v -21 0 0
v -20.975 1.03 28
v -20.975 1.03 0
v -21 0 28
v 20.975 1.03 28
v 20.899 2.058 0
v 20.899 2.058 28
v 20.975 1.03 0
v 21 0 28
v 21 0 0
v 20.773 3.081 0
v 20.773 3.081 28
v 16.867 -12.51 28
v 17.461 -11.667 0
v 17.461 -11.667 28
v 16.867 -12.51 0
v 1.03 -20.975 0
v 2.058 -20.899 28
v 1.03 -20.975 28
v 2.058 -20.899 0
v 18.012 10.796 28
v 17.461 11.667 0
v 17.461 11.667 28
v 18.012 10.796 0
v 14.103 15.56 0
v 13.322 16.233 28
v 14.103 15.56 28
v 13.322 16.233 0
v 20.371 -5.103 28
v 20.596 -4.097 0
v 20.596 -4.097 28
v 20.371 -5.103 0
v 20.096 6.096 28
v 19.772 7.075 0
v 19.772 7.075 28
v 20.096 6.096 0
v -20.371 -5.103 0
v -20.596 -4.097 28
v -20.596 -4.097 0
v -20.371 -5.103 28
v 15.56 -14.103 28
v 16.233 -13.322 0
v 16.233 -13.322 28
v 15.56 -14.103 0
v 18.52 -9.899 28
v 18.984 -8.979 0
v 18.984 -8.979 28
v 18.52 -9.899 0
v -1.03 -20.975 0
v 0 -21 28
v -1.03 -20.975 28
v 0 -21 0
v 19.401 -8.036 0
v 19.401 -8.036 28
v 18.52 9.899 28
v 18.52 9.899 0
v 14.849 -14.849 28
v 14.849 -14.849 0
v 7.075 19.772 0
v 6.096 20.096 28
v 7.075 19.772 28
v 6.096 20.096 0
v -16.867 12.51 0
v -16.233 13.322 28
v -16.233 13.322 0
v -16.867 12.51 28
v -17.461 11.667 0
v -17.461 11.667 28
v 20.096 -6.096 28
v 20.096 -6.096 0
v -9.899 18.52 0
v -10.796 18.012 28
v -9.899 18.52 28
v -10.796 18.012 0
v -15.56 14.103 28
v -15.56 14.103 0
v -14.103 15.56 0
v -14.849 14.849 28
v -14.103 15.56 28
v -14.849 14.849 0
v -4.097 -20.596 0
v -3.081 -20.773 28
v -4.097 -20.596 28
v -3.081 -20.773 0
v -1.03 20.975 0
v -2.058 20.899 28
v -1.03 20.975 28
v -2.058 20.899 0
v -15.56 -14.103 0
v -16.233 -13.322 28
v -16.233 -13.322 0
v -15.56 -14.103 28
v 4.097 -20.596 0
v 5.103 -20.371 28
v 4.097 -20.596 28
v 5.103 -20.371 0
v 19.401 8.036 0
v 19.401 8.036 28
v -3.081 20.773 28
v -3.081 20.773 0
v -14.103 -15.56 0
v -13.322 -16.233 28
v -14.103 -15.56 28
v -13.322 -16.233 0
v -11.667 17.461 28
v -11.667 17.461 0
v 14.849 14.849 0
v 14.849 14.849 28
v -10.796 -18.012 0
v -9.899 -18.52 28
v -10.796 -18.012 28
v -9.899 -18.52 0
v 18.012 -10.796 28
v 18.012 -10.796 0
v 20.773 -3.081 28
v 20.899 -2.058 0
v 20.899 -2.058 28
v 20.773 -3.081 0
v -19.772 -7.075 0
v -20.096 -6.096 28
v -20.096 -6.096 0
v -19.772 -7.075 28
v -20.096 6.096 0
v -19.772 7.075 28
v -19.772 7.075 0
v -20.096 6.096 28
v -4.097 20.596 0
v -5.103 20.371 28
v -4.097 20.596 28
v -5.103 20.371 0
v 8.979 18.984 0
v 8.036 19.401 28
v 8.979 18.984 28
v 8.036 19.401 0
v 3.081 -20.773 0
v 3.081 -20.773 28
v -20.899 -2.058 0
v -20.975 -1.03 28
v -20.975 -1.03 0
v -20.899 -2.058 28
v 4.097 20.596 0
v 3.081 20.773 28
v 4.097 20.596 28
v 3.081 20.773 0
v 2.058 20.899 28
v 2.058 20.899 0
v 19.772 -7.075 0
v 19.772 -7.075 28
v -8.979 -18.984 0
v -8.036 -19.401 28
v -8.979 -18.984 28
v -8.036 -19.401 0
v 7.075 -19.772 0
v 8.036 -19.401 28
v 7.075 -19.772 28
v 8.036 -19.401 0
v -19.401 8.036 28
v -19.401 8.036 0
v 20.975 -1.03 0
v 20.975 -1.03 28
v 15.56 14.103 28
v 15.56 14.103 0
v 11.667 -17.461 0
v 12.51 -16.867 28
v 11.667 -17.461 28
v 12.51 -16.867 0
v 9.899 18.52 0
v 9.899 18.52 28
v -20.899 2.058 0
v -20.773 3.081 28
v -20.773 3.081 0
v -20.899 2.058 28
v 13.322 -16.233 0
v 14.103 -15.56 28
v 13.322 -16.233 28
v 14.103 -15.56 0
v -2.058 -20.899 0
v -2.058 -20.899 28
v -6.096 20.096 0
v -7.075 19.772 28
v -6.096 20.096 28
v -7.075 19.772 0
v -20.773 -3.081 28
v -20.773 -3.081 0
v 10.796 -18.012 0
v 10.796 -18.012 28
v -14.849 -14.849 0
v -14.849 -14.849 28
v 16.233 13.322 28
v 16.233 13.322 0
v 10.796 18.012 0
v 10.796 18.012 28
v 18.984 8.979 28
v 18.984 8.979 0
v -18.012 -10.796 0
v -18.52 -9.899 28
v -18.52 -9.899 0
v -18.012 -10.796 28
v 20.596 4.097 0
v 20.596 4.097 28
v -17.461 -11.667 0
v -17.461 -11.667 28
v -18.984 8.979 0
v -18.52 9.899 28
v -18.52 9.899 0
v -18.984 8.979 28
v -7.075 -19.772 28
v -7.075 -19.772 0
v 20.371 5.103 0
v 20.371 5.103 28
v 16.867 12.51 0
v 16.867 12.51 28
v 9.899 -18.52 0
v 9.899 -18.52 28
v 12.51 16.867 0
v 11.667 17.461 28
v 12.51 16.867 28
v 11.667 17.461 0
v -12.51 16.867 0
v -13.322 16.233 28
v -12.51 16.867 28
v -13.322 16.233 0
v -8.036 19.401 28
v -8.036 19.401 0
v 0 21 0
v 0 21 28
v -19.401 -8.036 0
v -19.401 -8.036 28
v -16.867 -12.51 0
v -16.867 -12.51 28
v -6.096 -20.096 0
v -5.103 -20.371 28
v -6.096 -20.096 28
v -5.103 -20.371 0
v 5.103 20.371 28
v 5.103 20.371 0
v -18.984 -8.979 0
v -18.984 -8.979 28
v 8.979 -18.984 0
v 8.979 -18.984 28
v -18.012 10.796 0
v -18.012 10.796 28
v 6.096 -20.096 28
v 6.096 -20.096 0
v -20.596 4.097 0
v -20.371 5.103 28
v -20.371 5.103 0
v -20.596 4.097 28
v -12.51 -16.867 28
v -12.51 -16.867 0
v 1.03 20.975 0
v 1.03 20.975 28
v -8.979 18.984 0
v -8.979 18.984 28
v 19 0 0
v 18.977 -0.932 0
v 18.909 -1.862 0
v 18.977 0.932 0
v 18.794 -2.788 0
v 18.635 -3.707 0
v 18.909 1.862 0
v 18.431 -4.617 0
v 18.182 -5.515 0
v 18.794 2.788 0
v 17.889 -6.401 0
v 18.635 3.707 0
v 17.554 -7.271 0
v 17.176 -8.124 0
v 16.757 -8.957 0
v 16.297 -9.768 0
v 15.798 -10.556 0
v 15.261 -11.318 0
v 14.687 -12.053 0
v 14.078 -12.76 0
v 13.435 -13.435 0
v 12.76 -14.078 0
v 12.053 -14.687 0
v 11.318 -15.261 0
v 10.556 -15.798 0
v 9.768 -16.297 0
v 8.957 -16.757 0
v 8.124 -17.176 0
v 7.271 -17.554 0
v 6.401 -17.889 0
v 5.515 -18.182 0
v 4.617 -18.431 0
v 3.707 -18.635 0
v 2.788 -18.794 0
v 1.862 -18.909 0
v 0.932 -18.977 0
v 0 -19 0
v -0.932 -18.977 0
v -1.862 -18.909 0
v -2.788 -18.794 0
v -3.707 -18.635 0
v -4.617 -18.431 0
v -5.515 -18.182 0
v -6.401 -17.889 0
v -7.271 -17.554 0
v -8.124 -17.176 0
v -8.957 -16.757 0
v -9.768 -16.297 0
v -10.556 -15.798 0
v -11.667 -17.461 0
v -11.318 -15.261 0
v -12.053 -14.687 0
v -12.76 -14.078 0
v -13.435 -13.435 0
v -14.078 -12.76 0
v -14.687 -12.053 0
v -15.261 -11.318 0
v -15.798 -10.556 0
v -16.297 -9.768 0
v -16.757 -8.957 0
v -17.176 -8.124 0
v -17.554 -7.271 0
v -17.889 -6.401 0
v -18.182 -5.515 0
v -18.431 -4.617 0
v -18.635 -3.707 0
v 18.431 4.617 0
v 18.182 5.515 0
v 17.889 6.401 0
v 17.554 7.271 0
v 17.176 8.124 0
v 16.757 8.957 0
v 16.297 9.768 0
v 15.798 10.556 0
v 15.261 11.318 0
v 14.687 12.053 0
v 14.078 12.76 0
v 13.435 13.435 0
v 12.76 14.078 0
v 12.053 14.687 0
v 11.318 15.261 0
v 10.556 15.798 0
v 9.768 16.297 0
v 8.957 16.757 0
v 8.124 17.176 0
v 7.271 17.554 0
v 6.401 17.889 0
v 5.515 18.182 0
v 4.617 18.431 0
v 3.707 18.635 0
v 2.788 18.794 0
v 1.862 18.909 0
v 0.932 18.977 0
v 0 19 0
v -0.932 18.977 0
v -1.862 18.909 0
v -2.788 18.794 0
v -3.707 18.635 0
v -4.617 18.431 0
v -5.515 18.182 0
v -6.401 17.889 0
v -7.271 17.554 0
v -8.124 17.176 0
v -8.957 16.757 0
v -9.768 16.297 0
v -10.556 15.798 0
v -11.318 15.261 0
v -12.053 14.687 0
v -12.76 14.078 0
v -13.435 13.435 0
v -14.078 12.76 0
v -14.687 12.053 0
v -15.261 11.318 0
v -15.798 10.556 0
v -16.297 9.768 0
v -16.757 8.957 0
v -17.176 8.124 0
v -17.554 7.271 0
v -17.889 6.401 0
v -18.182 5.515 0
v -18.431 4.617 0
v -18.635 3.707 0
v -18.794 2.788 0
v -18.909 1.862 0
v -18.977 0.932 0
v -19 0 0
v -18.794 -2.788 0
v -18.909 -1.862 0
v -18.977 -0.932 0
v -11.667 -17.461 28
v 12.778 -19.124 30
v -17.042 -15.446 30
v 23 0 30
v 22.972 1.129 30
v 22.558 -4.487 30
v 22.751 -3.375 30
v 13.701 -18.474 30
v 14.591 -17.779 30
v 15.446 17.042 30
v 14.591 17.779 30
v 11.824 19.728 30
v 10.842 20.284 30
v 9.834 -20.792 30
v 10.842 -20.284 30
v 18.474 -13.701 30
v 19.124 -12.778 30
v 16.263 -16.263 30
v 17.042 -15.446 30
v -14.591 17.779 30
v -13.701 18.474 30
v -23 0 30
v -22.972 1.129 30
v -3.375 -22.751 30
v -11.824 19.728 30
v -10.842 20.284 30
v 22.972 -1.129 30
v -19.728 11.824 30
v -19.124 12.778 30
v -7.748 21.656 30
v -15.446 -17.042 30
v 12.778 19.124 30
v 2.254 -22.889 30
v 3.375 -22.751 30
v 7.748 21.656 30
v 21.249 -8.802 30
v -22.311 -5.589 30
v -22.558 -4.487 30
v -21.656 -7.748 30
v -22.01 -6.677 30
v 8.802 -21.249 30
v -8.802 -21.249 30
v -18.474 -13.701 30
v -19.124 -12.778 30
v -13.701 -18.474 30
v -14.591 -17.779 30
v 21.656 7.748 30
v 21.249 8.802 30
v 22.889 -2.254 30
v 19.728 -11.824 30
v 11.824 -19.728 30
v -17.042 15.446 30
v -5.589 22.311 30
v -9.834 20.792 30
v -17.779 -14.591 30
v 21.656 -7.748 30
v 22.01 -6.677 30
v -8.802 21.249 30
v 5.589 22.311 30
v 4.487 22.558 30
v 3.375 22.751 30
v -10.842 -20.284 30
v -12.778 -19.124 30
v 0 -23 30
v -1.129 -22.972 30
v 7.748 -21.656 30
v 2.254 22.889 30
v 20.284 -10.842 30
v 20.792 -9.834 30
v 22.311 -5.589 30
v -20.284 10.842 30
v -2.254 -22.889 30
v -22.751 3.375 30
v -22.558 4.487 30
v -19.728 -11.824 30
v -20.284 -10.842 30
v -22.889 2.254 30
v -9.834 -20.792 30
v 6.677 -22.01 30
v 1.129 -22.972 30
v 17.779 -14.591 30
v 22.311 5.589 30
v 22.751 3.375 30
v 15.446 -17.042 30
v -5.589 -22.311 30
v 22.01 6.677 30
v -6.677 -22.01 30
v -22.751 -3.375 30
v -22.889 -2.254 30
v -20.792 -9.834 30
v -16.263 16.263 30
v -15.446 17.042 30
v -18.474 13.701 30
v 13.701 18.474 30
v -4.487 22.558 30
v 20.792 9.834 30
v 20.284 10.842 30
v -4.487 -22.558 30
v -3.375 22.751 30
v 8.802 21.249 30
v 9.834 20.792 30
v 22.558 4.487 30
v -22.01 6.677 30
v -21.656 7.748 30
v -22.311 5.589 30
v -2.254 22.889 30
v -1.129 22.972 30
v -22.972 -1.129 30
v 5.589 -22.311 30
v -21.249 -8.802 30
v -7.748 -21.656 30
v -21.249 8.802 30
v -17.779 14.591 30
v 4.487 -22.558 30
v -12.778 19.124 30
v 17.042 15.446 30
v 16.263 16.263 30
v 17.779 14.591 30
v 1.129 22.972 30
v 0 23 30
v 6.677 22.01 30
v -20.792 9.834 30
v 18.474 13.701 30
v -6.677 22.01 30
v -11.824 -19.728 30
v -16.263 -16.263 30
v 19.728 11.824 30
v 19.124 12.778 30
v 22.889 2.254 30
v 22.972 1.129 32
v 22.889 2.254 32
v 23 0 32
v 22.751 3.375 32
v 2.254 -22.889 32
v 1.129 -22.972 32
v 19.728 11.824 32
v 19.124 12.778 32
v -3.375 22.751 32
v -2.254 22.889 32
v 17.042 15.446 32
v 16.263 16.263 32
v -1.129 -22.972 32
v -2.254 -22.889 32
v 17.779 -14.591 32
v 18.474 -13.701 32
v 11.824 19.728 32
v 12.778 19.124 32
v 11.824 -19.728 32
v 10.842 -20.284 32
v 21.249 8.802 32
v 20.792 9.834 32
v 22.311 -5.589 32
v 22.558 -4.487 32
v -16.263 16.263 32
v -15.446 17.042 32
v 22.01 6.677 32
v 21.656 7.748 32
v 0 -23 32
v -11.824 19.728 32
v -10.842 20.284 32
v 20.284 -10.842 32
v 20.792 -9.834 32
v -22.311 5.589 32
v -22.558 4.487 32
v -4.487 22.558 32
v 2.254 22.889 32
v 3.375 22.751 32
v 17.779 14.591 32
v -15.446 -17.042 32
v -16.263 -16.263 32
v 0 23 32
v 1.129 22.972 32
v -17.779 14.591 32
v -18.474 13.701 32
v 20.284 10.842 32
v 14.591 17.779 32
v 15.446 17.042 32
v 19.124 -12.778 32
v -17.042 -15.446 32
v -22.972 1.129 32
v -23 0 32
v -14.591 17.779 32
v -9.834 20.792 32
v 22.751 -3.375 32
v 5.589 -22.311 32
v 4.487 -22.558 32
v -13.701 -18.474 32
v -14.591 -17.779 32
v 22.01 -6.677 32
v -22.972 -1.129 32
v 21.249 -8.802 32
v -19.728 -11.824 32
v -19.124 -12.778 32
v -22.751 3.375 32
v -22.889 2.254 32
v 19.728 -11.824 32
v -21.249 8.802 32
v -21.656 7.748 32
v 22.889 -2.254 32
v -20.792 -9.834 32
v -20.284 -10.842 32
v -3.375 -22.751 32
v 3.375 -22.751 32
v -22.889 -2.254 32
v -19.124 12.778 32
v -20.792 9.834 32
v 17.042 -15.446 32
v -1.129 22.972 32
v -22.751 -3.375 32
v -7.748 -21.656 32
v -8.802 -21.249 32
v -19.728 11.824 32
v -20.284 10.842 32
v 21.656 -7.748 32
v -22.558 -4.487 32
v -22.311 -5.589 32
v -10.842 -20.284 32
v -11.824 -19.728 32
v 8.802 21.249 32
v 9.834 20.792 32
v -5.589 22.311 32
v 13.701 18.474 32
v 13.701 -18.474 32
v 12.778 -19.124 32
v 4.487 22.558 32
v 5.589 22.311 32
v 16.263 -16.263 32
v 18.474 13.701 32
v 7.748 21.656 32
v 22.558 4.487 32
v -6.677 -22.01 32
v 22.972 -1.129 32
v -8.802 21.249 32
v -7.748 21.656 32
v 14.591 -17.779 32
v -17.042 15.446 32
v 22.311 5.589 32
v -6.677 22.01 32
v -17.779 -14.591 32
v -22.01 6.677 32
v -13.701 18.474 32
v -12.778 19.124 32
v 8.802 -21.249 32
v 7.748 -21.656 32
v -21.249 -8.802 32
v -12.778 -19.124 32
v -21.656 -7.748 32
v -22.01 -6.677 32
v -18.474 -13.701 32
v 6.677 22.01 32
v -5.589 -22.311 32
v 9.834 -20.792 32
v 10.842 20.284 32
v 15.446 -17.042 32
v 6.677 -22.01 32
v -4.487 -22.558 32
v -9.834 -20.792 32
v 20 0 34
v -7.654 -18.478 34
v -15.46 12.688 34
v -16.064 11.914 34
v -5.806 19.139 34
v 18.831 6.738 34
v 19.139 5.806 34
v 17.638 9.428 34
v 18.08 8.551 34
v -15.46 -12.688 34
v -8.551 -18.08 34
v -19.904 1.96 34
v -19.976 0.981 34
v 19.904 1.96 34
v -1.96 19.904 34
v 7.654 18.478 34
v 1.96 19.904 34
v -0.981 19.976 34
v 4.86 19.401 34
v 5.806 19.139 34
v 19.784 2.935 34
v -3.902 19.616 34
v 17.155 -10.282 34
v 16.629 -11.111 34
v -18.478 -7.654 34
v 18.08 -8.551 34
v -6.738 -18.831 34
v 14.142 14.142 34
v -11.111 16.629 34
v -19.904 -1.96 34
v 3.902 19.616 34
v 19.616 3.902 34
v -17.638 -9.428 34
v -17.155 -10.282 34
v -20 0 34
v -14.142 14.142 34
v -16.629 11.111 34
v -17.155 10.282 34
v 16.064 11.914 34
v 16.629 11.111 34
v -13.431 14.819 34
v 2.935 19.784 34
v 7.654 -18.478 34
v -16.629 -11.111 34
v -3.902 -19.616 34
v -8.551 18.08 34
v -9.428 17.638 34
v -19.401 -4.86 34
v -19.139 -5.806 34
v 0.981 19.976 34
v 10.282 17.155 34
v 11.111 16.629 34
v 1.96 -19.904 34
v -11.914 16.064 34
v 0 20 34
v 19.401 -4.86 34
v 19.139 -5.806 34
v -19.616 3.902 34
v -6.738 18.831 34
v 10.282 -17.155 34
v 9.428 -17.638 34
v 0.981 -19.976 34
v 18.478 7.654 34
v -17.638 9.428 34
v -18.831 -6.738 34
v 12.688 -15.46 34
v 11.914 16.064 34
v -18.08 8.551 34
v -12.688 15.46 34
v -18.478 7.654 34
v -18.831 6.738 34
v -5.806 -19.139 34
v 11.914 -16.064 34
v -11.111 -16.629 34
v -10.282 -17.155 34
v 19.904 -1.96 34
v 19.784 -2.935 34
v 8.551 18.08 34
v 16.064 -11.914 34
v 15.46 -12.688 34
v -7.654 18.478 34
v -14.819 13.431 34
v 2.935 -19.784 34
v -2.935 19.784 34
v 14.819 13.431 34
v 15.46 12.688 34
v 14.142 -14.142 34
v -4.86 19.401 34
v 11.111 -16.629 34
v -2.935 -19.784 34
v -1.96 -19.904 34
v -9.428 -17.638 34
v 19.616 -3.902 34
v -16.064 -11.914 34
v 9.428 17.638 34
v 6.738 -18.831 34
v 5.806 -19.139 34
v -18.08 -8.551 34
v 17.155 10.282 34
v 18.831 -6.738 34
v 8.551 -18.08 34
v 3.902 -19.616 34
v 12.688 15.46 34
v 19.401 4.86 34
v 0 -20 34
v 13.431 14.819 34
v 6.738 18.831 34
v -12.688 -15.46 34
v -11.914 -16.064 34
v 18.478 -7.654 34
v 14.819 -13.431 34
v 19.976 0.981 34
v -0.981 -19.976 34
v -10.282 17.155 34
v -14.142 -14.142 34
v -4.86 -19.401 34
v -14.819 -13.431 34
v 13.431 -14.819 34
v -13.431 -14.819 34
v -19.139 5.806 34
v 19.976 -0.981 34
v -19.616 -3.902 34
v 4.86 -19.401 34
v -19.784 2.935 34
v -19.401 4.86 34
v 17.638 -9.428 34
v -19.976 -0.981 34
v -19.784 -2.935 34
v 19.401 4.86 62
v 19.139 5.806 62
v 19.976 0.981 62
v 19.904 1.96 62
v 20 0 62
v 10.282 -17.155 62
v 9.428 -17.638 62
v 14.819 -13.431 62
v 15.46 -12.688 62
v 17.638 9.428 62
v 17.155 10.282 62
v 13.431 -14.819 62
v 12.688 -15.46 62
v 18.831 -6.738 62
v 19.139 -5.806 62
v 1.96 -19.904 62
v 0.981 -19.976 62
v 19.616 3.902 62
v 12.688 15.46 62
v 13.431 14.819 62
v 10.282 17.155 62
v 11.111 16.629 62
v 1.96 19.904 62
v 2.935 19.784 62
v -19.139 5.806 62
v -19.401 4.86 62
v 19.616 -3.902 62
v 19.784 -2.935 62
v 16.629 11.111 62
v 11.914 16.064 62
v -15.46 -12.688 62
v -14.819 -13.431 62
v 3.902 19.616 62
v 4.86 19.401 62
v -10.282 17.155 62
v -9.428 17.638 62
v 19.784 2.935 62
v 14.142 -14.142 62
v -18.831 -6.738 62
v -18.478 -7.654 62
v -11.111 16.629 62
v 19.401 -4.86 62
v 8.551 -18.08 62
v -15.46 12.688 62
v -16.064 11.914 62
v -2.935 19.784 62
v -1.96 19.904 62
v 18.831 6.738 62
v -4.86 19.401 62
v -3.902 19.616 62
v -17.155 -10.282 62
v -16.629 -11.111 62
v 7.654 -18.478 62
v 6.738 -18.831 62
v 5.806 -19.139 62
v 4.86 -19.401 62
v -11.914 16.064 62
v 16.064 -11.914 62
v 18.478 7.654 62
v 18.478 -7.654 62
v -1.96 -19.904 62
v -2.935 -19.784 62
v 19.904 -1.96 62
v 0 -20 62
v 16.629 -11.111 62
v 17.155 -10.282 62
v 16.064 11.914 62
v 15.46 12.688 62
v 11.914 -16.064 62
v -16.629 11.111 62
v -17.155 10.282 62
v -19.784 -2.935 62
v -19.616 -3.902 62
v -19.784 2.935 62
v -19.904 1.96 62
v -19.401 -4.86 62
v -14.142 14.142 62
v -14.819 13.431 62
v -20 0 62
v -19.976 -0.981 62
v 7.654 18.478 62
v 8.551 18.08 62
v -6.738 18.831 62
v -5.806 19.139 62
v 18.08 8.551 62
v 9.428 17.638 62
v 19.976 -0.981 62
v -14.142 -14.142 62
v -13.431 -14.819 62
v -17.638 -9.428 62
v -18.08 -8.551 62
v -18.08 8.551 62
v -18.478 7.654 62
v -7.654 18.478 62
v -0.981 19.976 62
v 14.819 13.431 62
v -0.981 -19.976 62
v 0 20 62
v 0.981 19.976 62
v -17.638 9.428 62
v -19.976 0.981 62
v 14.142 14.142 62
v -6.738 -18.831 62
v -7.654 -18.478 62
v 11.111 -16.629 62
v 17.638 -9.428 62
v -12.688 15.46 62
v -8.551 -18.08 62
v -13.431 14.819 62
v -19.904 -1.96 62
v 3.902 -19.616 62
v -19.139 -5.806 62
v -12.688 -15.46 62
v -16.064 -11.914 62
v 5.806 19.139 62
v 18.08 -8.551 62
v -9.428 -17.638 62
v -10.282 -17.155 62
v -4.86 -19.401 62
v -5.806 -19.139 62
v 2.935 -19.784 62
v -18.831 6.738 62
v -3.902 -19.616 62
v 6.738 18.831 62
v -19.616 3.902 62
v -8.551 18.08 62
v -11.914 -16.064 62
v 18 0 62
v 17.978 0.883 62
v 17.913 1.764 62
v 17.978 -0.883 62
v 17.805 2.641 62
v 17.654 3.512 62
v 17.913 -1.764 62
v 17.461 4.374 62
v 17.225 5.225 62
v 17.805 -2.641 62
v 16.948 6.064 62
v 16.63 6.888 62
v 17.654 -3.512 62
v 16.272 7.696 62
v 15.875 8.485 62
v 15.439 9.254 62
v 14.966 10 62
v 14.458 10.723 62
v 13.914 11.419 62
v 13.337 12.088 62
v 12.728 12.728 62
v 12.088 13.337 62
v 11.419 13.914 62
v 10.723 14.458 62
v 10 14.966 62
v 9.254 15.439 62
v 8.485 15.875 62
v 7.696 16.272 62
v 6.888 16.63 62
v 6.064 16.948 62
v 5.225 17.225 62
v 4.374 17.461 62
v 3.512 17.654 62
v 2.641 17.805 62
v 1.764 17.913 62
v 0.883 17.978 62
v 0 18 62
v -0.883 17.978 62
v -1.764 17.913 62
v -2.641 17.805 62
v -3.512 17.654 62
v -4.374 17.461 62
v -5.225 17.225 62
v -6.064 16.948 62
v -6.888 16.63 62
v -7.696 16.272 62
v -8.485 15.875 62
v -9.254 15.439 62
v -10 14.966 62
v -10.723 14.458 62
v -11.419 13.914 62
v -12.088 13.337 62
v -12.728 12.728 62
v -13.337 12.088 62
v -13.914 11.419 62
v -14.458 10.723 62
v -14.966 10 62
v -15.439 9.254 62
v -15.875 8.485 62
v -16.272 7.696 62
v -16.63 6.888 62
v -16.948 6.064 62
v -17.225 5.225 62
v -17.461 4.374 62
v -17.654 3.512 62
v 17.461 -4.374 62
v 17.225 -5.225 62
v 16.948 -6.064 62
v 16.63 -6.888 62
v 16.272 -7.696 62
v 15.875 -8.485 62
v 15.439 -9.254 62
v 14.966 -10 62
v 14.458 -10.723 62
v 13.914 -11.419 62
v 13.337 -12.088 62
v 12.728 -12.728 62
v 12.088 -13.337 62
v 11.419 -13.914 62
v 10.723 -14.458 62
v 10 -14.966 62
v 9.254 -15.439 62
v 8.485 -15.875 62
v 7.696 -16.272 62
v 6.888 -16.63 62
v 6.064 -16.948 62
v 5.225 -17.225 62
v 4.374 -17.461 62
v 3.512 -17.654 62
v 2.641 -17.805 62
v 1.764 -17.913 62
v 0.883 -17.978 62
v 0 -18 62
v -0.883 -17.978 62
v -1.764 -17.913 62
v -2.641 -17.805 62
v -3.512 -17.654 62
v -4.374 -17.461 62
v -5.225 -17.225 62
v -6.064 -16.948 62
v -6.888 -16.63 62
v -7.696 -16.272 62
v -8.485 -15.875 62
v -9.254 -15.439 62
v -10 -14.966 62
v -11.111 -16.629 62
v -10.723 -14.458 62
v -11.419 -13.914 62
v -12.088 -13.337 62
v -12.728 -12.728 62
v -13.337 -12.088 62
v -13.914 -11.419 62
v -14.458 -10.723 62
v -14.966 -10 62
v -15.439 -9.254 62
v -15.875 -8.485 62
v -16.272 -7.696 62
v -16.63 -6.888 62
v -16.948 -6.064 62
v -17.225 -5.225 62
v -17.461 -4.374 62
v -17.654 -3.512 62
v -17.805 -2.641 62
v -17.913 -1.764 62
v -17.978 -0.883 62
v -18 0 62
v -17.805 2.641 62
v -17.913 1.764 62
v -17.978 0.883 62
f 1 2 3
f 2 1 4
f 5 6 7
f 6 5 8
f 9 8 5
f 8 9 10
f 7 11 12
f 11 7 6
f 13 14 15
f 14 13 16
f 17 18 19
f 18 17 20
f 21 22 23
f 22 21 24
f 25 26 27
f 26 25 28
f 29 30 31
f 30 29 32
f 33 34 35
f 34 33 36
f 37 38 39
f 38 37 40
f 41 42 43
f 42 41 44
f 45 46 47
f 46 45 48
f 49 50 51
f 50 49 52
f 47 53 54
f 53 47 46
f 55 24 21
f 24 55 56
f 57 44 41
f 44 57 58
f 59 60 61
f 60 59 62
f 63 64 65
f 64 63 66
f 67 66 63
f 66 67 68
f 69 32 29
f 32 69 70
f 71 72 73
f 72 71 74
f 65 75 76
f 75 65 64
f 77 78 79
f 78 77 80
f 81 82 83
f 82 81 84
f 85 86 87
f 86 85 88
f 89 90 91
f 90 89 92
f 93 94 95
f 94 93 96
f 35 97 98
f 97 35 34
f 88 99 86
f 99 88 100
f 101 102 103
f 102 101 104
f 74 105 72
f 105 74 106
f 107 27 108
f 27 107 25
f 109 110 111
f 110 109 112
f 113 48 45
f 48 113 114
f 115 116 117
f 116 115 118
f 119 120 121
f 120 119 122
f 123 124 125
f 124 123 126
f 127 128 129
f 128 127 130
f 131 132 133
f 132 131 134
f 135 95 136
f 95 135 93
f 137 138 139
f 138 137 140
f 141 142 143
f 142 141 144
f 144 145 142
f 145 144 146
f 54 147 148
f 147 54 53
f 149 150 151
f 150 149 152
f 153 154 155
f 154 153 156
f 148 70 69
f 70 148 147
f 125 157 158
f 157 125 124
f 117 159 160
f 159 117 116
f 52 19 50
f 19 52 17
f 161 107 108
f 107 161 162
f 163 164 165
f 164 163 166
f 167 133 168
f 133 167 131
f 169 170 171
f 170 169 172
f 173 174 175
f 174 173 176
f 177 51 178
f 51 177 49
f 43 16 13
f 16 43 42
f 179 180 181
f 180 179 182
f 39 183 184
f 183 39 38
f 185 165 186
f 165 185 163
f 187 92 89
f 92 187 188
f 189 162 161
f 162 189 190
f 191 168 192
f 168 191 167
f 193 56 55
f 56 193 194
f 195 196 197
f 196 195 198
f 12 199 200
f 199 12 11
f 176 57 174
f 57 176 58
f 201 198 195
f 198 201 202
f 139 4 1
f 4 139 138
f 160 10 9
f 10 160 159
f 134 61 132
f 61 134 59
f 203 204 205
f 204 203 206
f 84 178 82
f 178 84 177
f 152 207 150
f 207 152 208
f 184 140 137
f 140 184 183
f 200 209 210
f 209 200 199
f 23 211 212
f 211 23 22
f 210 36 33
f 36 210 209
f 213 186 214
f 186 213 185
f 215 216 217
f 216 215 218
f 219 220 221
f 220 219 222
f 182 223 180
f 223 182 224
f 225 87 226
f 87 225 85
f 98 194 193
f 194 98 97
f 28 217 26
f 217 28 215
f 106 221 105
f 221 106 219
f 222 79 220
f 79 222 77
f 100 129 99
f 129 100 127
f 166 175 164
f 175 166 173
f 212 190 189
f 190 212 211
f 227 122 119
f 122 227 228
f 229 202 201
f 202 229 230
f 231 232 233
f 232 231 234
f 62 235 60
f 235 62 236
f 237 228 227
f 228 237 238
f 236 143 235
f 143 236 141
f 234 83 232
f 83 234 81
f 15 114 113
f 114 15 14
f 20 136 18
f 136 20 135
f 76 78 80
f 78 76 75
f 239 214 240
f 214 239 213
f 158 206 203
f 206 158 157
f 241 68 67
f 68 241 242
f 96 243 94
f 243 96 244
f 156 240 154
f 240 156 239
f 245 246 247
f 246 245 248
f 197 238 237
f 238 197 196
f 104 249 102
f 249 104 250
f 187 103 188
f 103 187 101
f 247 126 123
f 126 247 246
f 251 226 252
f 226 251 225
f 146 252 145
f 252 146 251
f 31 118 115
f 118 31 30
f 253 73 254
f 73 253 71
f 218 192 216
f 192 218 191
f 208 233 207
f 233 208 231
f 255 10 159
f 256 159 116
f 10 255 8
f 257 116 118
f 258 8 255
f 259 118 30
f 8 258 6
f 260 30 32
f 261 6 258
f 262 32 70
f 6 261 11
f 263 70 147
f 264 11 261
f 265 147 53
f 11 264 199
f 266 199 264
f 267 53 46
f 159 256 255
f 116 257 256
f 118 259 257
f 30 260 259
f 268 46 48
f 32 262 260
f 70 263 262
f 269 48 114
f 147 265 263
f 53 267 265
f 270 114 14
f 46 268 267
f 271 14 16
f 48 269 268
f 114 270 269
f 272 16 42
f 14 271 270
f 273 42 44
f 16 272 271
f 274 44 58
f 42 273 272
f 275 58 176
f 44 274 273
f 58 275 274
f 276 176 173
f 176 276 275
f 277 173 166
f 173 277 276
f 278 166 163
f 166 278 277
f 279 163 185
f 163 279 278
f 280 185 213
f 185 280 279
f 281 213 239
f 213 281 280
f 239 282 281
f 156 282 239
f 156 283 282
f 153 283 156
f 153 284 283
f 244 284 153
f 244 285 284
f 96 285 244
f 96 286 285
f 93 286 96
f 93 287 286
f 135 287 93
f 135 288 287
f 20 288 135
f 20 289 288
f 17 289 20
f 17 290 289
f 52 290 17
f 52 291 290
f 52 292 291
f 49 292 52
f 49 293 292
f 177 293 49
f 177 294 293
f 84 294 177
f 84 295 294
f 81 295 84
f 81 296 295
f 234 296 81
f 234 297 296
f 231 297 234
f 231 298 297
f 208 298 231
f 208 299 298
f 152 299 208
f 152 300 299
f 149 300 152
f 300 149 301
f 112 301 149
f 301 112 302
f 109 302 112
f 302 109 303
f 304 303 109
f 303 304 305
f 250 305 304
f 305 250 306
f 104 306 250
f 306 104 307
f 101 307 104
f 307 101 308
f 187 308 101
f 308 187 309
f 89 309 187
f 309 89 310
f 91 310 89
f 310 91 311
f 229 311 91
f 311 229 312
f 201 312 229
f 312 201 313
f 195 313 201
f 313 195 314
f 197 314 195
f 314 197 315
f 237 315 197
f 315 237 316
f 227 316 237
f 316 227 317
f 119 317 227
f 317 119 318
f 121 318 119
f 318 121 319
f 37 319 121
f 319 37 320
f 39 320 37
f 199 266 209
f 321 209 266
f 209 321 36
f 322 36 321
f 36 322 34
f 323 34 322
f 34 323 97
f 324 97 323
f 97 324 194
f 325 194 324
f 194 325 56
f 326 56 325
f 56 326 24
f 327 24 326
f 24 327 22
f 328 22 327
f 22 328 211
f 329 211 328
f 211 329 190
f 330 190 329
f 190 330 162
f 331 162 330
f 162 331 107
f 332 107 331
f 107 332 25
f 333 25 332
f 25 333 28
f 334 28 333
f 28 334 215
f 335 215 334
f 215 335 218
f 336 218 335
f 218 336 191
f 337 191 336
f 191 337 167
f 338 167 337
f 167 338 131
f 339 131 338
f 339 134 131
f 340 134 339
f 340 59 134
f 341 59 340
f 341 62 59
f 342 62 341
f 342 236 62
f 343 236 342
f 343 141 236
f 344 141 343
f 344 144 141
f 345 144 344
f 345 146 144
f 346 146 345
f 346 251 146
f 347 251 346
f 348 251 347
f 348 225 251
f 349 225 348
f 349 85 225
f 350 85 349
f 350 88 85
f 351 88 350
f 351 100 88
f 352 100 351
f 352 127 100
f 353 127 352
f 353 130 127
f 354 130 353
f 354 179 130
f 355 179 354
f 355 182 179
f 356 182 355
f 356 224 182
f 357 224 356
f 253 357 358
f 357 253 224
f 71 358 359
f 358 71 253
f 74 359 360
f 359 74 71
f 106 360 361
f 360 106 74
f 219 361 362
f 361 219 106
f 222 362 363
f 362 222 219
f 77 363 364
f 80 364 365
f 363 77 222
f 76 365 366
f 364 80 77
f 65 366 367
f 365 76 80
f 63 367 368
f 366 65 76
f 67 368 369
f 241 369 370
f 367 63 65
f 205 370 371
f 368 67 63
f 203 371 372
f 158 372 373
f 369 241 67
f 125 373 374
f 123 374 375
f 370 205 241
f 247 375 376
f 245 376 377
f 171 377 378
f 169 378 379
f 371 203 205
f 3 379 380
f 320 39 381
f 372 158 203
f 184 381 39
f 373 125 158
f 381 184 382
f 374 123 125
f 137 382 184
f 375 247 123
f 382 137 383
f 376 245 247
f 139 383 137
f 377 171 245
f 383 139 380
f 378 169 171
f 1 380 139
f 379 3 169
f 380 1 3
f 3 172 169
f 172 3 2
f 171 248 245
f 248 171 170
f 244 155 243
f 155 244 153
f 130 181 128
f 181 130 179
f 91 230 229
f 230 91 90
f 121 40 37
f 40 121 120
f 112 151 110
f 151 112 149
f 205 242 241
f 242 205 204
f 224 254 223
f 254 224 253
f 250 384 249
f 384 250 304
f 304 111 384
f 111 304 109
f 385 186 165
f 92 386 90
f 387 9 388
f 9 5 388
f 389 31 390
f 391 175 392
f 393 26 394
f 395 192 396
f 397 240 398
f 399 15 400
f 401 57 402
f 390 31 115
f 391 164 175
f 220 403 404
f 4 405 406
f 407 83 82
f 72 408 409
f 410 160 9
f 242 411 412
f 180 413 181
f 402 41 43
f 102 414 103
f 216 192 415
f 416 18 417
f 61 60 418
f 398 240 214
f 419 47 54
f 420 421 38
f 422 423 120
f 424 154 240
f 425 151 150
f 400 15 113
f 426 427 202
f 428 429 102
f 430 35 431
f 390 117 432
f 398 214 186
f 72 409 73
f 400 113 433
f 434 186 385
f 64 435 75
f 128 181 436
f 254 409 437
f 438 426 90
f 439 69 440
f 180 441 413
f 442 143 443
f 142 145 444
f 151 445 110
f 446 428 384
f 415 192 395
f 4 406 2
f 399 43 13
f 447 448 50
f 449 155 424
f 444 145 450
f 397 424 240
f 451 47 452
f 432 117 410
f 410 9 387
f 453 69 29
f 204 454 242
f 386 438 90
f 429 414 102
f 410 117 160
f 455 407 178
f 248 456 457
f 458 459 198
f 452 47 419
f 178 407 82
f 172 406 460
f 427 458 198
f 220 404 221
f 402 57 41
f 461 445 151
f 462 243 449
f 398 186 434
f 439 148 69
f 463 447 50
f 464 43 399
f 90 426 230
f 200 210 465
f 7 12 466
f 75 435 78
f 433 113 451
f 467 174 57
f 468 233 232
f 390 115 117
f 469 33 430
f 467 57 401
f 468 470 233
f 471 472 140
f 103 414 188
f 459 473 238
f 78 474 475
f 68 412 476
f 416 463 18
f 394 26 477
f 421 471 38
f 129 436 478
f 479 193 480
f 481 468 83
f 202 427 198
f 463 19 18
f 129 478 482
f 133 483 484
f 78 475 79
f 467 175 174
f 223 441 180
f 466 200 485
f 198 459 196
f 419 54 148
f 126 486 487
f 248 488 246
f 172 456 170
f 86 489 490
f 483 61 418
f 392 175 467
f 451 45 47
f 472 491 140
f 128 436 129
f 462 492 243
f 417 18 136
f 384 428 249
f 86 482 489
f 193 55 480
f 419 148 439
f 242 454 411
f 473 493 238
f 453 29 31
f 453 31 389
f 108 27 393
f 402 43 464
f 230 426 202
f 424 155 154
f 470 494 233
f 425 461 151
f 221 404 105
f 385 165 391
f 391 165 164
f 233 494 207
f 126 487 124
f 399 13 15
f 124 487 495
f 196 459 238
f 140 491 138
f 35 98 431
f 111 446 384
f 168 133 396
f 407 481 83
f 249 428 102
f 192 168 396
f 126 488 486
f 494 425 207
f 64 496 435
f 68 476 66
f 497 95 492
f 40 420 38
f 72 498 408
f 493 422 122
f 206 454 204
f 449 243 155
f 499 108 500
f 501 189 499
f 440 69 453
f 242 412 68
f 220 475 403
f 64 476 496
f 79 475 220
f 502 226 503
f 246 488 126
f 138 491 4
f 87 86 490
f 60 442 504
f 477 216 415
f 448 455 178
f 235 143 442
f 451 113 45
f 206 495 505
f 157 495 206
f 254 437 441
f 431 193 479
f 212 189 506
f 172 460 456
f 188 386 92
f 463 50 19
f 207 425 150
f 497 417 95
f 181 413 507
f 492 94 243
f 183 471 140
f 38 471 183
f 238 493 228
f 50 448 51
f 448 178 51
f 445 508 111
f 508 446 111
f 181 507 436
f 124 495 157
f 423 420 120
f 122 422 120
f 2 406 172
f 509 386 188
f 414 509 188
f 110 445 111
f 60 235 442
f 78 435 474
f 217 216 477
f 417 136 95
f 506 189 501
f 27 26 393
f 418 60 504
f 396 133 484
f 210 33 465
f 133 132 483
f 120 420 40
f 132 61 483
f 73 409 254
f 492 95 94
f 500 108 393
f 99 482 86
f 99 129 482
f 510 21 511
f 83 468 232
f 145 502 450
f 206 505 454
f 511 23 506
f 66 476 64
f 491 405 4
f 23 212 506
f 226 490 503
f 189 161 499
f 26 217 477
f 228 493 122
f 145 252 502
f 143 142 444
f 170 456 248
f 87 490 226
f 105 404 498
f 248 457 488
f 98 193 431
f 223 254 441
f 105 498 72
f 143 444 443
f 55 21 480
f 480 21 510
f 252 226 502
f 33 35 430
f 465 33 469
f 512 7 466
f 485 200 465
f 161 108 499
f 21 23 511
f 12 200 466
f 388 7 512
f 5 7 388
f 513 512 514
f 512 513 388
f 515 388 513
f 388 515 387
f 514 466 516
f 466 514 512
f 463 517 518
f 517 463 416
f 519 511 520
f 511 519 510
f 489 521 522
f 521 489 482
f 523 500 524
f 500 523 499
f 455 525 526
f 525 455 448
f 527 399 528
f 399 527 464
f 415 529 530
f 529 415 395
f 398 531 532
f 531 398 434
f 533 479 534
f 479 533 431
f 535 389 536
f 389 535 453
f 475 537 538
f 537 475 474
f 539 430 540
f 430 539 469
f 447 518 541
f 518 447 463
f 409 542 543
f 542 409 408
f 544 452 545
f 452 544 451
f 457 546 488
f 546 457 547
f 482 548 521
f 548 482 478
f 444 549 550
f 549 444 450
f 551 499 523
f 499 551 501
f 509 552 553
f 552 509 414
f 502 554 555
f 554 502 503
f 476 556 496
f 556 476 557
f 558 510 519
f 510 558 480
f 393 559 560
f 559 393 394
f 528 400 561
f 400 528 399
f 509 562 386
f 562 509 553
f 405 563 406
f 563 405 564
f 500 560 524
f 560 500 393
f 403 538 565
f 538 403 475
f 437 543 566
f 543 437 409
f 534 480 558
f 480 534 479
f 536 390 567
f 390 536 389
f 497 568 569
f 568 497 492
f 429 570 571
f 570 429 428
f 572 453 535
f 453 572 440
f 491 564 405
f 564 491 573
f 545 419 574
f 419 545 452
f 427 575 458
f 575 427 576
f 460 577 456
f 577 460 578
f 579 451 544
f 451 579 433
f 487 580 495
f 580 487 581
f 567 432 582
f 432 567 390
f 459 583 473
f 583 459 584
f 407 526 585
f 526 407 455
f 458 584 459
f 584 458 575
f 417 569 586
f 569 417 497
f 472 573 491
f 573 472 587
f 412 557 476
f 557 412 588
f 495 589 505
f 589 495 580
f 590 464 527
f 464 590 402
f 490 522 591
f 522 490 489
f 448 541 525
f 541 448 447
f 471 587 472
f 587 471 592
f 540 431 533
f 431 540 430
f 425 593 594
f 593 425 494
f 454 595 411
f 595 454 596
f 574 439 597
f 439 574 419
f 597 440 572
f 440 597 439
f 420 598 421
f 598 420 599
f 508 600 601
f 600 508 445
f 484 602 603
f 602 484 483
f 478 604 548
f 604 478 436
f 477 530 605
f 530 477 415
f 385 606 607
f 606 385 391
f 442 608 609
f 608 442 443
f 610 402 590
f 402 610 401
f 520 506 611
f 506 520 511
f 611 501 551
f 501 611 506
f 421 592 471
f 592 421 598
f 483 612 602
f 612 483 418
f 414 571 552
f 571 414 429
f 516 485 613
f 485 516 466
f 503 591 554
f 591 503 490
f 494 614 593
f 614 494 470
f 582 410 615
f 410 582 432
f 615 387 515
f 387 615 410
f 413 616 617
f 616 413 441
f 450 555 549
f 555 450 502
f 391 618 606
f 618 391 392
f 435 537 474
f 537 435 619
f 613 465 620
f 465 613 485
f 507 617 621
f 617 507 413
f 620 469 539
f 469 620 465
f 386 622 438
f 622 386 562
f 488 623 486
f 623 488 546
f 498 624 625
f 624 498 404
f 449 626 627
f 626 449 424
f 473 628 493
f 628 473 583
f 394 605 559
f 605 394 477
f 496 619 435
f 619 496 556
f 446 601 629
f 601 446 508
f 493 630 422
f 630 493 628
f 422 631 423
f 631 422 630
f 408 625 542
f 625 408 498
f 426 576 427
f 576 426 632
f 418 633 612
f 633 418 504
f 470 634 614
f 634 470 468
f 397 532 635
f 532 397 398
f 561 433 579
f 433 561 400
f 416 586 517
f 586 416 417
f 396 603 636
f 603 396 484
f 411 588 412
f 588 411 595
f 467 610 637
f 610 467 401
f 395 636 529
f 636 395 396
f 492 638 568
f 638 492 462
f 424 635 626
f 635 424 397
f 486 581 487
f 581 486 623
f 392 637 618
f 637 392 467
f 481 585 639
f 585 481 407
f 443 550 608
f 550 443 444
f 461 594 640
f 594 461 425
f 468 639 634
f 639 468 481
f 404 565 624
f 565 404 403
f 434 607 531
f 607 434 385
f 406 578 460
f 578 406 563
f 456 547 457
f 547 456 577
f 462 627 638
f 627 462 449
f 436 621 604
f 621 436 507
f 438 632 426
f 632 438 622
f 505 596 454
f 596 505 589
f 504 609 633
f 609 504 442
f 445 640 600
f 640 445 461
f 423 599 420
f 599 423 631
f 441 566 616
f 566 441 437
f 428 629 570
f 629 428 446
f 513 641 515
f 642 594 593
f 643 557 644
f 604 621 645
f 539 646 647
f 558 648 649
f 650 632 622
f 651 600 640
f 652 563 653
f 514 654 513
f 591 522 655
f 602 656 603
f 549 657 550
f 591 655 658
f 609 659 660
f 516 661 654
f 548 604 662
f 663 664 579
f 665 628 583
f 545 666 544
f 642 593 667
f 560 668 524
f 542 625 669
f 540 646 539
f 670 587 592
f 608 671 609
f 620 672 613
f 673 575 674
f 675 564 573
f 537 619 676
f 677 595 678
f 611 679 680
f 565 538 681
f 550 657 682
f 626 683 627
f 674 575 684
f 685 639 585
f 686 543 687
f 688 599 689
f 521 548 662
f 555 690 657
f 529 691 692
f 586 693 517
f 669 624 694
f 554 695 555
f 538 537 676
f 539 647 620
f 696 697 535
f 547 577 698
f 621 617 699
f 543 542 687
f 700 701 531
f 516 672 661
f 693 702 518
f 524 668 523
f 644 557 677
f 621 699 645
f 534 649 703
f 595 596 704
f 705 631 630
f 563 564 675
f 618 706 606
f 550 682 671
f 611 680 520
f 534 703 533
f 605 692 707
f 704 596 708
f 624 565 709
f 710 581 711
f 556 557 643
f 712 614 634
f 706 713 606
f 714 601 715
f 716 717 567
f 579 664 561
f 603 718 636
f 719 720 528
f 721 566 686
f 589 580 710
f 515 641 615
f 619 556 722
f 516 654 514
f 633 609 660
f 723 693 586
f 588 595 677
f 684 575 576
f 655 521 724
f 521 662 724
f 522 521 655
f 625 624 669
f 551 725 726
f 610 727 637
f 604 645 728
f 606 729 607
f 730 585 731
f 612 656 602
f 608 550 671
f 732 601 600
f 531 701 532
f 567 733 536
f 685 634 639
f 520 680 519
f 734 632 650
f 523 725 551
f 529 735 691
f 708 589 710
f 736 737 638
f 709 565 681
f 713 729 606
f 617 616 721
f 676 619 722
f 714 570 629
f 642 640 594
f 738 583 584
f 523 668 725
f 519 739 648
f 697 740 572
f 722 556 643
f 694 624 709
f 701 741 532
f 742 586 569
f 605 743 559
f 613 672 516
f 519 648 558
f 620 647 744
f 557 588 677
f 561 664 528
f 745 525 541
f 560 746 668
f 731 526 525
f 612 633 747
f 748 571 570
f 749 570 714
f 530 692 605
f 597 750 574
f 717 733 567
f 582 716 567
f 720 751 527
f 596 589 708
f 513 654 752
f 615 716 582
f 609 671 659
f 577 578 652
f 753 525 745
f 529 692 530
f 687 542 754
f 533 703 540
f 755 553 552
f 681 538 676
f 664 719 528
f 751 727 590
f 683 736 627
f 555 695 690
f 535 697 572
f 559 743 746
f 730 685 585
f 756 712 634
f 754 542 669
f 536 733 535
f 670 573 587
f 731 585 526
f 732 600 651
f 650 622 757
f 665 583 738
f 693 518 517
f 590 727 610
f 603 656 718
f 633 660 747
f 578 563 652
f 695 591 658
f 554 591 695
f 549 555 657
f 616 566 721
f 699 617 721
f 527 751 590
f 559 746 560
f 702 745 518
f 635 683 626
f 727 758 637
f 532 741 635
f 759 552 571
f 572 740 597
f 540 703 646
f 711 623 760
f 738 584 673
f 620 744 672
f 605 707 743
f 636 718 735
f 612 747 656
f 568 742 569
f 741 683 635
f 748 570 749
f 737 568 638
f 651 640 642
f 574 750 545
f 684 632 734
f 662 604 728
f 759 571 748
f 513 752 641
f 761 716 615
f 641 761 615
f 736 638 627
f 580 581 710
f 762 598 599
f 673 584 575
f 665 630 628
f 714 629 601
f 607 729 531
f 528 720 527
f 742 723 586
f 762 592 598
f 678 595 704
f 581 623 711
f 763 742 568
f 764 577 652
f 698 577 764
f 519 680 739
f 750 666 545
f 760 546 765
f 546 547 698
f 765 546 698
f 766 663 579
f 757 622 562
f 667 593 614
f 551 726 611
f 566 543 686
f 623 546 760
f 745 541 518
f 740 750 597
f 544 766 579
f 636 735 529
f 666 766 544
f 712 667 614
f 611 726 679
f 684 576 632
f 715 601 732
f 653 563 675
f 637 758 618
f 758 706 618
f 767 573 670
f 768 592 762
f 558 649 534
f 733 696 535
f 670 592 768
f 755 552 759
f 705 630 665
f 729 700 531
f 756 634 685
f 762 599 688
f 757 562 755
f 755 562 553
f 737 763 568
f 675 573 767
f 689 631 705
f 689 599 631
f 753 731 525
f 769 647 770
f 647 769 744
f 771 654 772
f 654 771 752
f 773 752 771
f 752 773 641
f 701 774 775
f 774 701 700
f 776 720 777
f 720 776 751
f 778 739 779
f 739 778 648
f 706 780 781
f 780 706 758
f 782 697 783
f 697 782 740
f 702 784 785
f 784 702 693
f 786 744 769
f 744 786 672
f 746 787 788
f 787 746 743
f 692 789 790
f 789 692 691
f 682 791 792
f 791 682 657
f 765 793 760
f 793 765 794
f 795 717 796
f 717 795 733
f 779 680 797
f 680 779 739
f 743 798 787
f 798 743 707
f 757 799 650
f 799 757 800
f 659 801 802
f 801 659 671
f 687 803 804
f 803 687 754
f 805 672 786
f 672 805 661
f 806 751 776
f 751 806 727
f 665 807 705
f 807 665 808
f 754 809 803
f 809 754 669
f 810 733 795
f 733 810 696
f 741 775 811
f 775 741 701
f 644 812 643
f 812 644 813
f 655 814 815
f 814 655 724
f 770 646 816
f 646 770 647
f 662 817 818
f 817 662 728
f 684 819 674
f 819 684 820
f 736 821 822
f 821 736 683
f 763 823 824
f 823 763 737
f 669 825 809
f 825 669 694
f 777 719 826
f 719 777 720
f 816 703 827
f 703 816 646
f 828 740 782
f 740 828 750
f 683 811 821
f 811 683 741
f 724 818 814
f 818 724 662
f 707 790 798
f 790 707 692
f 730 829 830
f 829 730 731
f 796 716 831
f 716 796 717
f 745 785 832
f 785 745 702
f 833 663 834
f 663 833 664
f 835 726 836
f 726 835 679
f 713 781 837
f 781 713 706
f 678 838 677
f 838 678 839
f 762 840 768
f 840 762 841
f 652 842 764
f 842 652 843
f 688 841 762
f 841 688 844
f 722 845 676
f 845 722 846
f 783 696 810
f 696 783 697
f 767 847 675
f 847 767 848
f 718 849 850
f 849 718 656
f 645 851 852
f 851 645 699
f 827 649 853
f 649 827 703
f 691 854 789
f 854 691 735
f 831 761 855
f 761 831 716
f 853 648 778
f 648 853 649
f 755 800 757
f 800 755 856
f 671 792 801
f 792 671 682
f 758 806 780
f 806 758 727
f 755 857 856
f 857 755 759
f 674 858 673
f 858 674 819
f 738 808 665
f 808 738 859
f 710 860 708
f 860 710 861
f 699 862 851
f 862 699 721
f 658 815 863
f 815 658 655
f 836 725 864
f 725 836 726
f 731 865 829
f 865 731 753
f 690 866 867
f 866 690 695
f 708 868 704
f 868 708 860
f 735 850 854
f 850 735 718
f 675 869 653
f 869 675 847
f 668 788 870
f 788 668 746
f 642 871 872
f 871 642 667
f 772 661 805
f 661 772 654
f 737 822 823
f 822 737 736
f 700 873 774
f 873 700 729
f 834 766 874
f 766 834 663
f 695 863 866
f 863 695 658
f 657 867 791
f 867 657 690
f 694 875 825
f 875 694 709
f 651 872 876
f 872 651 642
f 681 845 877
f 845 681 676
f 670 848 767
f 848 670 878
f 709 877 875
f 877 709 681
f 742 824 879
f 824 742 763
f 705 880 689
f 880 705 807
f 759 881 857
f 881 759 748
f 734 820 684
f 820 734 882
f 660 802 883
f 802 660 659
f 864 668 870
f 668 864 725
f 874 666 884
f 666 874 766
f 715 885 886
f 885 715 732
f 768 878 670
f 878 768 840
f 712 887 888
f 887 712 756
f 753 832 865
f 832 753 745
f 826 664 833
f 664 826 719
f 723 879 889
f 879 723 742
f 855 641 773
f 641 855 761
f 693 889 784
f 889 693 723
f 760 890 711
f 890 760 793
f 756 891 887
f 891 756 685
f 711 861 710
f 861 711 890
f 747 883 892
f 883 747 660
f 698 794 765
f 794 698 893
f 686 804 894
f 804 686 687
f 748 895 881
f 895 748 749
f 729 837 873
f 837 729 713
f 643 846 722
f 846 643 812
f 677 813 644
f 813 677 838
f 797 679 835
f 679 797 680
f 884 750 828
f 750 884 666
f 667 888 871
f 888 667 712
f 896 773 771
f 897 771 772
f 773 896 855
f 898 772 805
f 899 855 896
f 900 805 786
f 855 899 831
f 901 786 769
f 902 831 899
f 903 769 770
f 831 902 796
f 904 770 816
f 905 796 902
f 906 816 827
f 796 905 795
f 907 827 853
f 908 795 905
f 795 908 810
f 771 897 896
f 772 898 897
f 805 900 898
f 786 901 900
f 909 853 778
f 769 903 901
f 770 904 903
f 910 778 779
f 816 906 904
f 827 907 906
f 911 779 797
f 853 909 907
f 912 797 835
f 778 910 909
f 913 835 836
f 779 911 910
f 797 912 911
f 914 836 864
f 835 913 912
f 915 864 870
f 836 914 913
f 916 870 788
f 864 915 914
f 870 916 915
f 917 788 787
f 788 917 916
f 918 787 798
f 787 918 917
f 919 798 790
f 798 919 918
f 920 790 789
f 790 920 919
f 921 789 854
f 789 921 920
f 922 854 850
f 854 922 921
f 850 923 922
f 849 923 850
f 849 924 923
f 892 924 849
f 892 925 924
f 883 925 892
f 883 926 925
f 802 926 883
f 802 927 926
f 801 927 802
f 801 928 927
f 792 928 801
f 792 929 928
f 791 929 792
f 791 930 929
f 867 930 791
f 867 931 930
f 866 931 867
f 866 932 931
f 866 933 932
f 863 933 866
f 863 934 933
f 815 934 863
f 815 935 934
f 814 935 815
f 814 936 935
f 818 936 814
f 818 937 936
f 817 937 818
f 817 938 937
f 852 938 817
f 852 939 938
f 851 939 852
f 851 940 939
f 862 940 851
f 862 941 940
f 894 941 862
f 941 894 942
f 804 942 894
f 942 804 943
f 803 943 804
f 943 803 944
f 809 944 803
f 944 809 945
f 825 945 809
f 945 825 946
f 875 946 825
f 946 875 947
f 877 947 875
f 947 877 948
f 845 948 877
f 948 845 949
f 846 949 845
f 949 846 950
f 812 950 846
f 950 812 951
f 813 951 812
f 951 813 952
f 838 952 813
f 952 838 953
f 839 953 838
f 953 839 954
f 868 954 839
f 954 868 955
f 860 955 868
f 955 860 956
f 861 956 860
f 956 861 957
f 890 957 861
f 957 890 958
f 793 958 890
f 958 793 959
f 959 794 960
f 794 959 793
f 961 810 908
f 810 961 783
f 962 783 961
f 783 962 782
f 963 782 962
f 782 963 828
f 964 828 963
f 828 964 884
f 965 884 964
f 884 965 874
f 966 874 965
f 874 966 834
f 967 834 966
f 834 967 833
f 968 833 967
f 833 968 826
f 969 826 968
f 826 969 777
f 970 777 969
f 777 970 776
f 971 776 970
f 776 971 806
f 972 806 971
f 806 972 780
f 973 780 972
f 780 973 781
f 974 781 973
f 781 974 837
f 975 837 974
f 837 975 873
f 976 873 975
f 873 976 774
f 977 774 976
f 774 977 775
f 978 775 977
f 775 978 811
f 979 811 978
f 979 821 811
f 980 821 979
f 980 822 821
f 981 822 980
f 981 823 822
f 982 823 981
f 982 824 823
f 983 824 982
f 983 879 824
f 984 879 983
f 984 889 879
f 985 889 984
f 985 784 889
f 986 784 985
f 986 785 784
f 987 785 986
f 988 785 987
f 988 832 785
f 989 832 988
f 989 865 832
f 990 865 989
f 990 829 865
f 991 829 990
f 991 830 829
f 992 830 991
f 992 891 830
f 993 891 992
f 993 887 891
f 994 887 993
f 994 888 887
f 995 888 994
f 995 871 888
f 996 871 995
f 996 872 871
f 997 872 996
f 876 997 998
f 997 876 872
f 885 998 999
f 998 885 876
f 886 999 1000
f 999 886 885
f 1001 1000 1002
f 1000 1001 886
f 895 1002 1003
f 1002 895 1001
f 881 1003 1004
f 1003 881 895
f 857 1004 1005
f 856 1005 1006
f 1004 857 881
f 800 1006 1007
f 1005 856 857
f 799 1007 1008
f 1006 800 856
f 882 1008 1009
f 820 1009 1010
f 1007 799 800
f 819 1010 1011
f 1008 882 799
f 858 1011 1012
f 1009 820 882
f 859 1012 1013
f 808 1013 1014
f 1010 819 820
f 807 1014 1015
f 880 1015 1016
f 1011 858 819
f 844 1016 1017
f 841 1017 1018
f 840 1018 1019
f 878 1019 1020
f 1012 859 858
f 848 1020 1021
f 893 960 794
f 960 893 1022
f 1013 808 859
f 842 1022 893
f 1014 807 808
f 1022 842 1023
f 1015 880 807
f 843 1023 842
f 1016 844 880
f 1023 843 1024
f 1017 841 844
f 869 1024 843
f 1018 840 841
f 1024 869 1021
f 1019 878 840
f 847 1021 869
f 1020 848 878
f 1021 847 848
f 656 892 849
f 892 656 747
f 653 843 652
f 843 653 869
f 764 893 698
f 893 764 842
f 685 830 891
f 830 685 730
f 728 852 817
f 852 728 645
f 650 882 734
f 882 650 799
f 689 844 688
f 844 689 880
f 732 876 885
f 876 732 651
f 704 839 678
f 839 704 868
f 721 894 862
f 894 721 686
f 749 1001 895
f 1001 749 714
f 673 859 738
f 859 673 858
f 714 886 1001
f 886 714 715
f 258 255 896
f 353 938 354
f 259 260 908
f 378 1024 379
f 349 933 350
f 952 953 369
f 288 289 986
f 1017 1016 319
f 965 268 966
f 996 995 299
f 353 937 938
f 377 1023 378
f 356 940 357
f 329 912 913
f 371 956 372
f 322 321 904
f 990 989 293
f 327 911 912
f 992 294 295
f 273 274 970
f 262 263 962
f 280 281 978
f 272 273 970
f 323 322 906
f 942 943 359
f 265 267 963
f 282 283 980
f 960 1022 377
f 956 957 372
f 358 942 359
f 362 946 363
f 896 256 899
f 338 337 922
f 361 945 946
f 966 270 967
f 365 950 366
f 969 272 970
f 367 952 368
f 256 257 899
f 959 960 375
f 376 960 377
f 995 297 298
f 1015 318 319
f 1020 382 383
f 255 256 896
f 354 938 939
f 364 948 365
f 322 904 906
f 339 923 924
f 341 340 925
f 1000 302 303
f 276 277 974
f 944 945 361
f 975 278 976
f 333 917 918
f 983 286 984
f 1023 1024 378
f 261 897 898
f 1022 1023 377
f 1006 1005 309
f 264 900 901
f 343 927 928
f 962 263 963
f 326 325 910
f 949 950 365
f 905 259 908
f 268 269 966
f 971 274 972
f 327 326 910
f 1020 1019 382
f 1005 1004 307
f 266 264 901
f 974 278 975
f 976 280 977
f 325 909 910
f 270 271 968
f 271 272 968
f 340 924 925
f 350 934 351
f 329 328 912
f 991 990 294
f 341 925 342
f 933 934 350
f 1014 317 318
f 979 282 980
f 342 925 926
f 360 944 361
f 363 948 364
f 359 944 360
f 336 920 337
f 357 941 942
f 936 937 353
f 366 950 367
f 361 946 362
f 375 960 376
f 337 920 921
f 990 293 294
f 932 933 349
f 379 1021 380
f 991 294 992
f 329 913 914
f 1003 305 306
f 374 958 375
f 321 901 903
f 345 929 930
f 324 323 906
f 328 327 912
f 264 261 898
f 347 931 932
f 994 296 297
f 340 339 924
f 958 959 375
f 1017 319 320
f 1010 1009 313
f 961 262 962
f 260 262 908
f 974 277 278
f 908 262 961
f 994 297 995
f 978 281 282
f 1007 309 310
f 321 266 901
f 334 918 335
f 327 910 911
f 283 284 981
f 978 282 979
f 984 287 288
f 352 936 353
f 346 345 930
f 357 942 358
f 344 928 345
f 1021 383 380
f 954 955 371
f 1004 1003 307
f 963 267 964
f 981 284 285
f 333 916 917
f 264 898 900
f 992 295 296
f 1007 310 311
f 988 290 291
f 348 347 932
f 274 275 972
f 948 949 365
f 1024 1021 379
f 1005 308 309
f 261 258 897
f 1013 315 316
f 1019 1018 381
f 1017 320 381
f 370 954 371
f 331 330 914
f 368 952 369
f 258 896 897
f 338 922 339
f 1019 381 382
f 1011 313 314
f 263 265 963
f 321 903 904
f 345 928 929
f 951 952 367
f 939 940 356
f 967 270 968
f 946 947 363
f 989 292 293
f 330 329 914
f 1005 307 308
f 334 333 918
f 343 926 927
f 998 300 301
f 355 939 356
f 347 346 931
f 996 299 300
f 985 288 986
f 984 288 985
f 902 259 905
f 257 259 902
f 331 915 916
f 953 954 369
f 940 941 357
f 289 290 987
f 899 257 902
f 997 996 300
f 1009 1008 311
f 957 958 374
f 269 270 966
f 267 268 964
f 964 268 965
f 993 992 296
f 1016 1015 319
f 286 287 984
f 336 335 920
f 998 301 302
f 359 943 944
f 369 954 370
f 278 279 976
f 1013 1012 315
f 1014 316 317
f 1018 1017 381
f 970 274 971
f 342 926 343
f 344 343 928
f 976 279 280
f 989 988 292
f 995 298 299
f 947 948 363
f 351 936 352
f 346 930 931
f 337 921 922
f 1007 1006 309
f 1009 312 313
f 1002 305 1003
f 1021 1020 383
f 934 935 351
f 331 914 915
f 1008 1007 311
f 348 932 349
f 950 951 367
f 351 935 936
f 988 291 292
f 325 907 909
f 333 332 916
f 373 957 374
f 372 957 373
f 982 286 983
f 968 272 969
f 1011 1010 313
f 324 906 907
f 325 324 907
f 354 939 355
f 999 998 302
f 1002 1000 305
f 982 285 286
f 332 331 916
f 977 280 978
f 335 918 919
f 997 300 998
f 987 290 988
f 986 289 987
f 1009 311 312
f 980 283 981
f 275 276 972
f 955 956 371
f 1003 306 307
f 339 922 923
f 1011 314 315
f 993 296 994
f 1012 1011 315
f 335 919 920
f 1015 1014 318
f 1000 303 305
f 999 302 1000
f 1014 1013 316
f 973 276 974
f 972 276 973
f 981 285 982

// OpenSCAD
$fn=128;

thickness=2;

difference() {
  union() {
    cylinder(h=30, d=42);
    // Create a 45 deg overhang for printing.
    translate([0, 0, 28]) cylinder(h=2, d1=42, d2=46);
    translate([0, 0, 30]) cylinder(h=2, d=46);
    translate([0, 0, 32]) cylinder(h=2, d1=46, d2=40);
    translate([0, 0, 32]) cylinder(h=30, d=40);
  }
  cylinder(h=62, d1=42-thickness*2, d2=40-thickness*2);
}
